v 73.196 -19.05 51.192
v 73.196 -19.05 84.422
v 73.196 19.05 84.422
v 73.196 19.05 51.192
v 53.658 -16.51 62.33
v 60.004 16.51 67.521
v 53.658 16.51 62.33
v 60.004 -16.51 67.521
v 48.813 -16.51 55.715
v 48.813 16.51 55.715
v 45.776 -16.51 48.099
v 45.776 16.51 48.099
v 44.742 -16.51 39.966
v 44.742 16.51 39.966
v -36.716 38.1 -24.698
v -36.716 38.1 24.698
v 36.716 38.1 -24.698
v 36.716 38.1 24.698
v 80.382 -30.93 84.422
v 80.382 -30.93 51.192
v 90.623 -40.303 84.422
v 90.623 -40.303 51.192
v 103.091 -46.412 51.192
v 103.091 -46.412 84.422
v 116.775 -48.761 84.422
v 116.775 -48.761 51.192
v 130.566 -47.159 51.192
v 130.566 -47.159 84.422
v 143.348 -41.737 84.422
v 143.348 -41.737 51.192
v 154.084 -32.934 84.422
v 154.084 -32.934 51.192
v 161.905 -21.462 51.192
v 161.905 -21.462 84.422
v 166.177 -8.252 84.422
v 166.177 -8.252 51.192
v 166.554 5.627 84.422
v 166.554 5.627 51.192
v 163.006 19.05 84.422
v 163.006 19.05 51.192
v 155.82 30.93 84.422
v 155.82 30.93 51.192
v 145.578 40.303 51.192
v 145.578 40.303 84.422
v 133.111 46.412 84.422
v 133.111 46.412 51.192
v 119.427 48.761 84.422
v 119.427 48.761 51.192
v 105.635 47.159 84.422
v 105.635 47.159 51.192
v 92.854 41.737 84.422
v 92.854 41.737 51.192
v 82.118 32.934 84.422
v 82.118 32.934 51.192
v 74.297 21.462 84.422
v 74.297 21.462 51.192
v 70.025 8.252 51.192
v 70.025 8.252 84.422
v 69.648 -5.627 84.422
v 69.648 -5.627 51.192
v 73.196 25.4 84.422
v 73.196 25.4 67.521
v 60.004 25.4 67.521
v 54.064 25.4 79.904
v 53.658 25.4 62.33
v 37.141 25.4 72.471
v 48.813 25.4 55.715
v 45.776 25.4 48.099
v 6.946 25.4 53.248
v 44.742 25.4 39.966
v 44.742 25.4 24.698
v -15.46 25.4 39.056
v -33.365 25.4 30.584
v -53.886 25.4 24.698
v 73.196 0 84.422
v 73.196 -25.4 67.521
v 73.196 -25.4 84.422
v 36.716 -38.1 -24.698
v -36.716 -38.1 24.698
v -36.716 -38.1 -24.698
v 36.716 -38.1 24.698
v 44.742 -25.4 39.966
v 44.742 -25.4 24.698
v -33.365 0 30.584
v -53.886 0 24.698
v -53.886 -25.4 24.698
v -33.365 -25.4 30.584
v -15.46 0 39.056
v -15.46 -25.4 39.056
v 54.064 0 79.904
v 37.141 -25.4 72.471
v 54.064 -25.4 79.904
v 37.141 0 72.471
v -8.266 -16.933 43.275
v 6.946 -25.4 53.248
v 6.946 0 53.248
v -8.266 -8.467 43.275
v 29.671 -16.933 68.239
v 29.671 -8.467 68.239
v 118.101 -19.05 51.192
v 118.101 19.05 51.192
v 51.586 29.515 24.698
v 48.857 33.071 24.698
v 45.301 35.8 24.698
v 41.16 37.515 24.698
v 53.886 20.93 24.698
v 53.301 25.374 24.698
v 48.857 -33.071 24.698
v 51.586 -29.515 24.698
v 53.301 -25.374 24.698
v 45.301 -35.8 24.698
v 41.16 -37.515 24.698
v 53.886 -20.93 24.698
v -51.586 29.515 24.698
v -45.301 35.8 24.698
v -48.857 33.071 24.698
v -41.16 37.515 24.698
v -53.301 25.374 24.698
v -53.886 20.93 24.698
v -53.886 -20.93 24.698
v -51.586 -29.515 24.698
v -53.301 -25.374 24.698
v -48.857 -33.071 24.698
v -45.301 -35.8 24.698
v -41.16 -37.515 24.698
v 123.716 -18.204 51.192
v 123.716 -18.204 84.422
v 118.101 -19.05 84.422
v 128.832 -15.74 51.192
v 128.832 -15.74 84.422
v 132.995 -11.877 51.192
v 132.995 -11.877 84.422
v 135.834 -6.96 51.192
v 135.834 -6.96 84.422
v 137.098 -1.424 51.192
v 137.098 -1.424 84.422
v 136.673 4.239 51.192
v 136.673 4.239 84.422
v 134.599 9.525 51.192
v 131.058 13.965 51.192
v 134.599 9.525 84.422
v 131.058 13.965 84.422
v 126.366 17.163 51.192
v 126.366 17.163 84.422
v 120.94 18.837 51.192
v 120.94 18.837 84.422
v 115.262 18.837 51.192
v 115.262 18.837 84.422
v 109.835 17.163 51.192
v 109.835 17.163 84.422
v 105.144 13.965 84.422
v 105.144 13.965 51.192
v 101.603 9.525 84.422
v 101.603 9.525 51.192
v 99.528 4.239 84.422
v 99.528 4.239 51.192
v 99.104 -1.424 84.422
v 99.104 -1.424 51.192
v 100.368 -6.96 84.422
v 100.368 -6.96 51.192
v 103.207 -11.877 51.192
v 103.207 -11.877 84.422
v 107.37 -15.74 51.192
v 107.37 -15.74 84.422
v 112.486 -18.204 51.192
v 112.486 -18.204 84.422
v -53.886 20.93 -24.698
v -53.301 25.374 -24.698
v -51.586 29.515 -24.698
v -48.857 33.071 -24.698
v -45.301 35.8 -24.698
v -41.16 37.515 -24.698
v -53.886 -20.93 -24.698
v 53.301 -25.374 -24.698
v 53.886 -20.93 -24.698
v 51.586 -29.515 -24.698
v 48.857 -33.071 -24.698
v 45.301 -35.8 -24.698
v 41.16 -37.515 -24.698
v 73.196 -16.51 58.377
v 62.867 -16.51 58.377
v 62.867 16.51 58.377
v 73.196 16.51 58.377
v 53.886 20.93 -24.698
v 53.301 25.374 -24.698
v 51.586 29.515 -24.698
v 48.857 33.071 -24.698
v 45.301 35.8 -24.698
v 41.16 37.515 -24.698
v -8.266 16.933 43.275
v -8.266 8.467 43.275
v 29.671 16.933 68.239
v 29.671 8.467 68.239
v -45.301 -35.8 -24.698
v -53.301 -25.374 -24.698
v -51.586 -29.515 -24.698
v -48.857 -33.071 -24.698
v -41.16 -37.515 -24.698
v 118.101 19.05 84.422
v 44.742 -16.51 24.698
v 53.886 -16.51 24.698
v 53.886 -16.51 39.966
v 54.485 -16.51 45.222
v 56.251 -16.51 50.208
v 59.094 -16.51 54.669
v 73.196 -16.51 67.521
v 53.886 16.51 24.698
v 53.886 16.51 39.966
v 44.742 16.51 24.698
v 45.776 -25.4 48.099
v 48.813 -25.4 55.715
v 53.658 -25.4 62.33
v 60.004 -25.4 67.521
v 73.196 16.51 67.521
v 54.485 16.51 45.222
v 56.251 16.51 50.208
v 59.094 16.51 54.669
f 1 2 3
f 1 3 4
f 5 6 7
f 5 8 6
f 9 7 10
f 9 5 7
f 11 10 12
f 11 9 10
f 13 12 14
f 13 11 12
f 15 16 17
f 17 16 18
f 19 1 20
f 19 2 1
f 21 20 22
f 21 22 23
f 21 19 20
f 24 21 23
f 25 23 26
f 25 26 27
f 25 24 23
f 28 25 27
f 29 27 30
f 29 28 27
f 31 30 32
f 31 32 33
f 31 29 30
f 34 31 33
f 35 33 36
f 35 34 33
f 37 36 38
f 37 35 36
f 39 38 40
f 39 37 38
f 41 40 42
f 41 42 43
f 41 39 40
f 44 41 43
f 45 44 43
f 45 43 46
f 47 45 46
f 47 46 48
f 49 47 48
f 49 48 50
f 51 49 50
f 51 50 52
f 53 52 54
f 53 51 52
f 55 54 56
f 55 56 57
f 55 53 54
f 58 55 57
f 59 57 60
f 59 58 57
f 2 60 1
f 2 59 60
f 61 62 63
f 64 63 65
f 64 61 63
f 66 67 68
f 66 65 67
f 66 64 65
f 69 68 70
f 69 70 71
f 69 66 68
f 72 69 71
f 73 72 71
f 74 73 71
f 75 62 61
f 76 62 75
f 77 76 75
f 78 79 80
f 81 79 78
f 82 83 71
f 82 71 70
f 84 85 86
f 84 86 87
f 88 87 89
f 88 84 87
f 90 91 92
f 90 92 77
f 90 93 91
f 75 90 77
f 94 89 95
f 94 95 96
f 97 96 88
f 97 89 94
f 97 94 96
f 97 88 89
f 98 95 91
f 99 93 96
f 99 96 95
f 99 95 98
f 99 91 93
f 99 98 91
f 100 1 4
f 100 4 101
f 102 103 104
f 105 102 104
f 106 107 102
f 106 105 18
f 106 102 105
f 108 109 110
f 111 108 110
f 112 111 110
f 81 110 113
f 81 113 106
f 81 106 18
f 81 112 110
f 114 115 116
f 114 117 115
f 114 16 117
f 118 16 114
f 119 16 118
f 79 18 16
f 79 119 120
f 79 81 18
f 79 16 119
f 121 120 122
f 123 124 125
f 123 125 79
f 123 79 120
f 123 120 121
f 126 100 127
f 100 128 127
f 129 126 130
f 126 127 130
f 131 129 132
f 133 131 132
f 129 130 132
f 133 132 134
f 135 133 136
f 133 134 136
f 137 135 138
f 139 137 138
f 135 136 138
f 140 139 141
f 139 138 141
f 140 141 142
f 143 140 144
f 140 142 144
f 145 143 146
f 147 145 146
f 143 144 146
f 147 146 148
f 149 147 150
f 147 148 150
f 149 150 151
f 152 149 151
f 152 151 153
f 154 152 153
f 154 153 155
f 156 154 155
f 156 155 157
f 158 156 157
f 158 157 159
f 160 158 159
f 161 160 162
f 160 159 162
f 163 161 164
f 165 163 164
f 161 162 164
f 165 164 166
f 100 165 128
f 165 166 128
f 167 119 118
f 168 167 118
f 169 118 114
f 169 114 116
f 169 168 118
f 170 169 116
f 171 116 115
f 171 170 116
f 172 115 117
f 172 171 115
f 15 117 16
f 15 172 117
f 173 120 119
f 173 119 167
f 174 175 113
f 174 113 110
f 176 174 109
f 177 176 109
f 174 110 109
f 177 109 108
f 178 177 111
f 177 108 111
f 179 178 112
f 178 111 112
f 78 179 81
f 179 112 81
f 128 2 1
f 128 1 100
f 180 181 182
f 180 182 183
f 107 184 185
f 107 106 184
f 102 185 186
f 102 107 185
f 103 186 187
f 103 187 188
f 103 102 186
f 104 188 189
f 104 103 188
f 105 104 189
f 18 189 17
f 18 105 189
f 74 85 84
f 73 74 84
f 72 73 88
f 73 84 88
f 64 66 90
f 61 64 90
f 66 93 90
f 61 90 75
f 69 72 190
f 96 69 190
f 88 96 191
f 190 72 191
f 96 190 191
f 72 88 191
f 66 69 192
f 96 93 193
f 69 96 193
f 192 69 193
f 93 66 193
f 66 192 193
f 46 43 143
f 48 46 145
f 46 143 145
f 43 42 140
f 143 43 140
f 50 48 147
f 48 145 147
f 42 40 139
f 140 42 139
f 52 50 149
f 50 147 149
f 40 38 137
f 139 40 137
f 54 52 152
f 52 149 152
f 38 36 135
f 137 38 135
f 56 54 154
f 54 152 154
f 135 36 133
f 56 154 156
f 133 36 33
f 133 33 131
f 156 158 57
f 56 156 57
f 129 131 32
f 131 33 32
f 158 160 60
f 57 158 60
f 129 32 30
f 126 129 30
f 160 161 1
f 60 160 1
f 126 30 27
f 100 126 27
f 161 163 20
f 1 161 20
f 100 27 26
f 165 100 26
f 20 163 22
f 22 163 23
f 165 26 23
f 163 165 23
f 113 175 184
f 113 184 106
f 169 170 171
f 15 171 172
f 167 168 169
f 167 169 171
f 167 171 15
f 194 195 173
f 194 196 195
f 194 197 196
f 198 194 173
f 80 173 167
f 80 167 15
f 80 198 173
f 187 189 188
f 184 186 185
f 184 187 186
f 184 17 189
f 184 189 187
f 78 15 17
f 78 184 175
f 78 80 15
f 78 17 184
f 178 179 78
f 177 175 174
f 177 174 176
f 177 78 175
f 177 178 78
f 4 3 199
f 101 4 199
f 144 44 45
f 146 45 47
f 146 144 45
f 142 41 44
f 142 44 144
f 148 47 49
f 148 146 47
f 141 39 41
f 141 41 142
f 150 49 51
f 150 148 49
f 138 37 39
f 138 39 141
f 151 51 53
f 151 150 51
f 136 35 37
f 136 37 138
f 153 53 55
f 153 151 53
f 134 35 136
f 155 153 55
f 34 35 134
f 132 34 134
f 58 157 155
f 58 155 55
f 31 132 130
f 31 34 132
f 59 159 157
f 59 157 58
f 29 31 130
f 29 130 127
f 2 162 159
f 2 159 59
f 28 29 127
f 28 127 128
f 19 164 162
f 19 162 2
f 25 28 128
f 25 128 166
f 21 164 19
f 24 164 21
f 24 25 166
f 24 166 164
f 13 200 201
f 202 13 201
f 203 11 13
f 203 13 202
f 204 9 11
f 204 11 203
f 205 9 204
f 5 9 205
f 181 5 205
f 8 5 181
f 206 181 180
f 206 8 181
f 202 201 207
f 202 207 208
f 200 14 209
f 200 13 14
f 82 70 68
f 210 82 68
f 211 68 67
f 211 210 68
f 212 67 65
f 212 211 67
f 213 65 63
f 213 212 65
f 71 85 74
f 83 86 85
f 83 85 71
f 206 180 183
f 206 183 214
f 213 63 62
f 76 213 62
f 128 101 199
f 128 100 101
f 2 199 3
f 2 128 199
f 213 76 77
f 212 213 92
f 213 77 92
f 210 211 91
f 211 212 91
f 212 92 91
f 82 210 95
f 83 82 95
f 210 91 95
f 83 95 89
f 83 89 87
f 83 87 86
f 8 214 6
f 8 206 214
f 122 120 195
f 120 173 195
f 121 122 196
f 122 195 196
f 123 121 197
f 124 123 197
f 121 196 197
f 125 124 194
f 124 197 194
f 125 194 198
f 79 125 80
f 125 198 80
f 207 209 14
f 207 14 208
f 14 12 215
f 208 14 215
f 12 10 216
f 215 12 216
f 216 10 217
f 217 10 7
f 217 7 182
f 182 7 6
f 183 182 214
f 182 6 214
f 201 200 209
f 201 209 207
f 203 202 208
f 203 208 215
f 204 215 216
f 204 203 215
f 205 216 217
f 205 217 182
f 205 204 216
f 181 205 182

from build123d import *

# Parameters (mm, degrees)
F1_DEPTH  = 38.1
F2_DEPTH  = 19.05
F3_DEPTH  = 25.4
F4_DEPTH  = 16.51
F2_FACE_W = 44.90526
F2_FACE_H = 33.229902
F6_R      = 17.169887


with BuildPart() as f1:
    # F0 (on Front) → F1 (new body, symmetric)
    with BuildSketch(Plane.XZ):
        Polygon((44.742323, 24.697902), (-53.886324, 24.697902), (-53.886324, -24.697902), (53.886324, -24.697902), (53.886324, 24.697902), align=None)
    extrude(amount=F1_DEPTH, both=True)

    # F6
    f6_edges = [f1.edges().sort_by_distance(p)[0] for p in [
        (-53.886324, -38.1, 0),
        (53.886324, -38.1, 0),
        (53.886324, 38.1, 0),
        (-53.886324, 38.1, 0),
    ]]
    fillet(f6_edges, radius=F6_R)


with BuildPart() as f2:
    # F0 (on Front) → F2 (new body, symmetric)
    with BuildSketch(Plane.XZ):
        Polygon((118.100852, 84.42191), (73.195592, 84.42191), (73.195592, 67.520853), (73.195592, 58.376852), (73.195592, 51.192008), (118.100852, 51.192008), align=None)
    extrude(amount=F2_DEPTH, both=True)


with BuildPart() as f3:
    # F0 (on Front) → F3 (new body, symmetric)
    with BuildSketch(Plane.XZ):
        with BuildLine():
            add(Edge.make_bspline(
                [(-53.886324, 24.697902), (0, 35.026111), (22.452634, 77.686124), (73.195592, 84.42191)],
                knots=[0, 0, 0, 0, 140.416418, 140.416418, 140.416418, 140.416418], degree=3))
            Line((-53.886324, 24.697902), (44.742323, 24.697902))
            Line((44.742323, 24.697902), (44.742323, 39.965693))
            ThreePointArc((44.742323, 39.965693), (48.81269, 55.715441), (60.004416, 67.520853))
            Line((60.004416, 67.520853), (73.195592, 67.520853))
            Line((73.195592, 67.520853), (73.195592, 84.42191))
        make_face()
    extrude(amount=F3_DEPTH, both=True)


with BuildPart() as f4:
    # F0 (on Front) → F4 (new body, symmetric)
    with BuildSketch(Plane.XZ):
        with BuildLine():
            Line((44.742323, 39.965693), (44.742323, 24.697902))
            Line((44.742323, 24.697902), (53.886324, 24.697902))
            Line((53.886324, 24.697902), (53.886324, 39.965693))
            ThreePointArc((53.886324, 39.965693), (56.251291, 50.20813), (62.867373, 58.376852))
            Line((62.867373, 58.376852), (73.195592, 58.376852))
            Line((73.195592, 58.376852), (73.195592, 67.520853))
            Line((73.195592, 67.520853), (60.004416, 67.520853))
            ThreePointArc((60.004416, 67.520853), (48.81269, 55.715441), (44.742323, 39.965693))
        make_face()
    extrude(amount=F4_DEPTH, both=True)


with BuildPart() as f5:
    # F2_face (on face) → F5 (revolve)
    with BuildSketch(Plane(origin=(95.648222, -19.05, 67.806959), x_dir=(1, 0, 0), z_dir=(0, -1, 0))):
        Rectangle(F2_FACE_W, F2_FACE_H)
    revolve(axis=Axis((118.100852, 0, 67.806959), (0, 0, 1)))


solid = Compound([f1.part, f2.part, f3.part, f4.part, f5.part])
